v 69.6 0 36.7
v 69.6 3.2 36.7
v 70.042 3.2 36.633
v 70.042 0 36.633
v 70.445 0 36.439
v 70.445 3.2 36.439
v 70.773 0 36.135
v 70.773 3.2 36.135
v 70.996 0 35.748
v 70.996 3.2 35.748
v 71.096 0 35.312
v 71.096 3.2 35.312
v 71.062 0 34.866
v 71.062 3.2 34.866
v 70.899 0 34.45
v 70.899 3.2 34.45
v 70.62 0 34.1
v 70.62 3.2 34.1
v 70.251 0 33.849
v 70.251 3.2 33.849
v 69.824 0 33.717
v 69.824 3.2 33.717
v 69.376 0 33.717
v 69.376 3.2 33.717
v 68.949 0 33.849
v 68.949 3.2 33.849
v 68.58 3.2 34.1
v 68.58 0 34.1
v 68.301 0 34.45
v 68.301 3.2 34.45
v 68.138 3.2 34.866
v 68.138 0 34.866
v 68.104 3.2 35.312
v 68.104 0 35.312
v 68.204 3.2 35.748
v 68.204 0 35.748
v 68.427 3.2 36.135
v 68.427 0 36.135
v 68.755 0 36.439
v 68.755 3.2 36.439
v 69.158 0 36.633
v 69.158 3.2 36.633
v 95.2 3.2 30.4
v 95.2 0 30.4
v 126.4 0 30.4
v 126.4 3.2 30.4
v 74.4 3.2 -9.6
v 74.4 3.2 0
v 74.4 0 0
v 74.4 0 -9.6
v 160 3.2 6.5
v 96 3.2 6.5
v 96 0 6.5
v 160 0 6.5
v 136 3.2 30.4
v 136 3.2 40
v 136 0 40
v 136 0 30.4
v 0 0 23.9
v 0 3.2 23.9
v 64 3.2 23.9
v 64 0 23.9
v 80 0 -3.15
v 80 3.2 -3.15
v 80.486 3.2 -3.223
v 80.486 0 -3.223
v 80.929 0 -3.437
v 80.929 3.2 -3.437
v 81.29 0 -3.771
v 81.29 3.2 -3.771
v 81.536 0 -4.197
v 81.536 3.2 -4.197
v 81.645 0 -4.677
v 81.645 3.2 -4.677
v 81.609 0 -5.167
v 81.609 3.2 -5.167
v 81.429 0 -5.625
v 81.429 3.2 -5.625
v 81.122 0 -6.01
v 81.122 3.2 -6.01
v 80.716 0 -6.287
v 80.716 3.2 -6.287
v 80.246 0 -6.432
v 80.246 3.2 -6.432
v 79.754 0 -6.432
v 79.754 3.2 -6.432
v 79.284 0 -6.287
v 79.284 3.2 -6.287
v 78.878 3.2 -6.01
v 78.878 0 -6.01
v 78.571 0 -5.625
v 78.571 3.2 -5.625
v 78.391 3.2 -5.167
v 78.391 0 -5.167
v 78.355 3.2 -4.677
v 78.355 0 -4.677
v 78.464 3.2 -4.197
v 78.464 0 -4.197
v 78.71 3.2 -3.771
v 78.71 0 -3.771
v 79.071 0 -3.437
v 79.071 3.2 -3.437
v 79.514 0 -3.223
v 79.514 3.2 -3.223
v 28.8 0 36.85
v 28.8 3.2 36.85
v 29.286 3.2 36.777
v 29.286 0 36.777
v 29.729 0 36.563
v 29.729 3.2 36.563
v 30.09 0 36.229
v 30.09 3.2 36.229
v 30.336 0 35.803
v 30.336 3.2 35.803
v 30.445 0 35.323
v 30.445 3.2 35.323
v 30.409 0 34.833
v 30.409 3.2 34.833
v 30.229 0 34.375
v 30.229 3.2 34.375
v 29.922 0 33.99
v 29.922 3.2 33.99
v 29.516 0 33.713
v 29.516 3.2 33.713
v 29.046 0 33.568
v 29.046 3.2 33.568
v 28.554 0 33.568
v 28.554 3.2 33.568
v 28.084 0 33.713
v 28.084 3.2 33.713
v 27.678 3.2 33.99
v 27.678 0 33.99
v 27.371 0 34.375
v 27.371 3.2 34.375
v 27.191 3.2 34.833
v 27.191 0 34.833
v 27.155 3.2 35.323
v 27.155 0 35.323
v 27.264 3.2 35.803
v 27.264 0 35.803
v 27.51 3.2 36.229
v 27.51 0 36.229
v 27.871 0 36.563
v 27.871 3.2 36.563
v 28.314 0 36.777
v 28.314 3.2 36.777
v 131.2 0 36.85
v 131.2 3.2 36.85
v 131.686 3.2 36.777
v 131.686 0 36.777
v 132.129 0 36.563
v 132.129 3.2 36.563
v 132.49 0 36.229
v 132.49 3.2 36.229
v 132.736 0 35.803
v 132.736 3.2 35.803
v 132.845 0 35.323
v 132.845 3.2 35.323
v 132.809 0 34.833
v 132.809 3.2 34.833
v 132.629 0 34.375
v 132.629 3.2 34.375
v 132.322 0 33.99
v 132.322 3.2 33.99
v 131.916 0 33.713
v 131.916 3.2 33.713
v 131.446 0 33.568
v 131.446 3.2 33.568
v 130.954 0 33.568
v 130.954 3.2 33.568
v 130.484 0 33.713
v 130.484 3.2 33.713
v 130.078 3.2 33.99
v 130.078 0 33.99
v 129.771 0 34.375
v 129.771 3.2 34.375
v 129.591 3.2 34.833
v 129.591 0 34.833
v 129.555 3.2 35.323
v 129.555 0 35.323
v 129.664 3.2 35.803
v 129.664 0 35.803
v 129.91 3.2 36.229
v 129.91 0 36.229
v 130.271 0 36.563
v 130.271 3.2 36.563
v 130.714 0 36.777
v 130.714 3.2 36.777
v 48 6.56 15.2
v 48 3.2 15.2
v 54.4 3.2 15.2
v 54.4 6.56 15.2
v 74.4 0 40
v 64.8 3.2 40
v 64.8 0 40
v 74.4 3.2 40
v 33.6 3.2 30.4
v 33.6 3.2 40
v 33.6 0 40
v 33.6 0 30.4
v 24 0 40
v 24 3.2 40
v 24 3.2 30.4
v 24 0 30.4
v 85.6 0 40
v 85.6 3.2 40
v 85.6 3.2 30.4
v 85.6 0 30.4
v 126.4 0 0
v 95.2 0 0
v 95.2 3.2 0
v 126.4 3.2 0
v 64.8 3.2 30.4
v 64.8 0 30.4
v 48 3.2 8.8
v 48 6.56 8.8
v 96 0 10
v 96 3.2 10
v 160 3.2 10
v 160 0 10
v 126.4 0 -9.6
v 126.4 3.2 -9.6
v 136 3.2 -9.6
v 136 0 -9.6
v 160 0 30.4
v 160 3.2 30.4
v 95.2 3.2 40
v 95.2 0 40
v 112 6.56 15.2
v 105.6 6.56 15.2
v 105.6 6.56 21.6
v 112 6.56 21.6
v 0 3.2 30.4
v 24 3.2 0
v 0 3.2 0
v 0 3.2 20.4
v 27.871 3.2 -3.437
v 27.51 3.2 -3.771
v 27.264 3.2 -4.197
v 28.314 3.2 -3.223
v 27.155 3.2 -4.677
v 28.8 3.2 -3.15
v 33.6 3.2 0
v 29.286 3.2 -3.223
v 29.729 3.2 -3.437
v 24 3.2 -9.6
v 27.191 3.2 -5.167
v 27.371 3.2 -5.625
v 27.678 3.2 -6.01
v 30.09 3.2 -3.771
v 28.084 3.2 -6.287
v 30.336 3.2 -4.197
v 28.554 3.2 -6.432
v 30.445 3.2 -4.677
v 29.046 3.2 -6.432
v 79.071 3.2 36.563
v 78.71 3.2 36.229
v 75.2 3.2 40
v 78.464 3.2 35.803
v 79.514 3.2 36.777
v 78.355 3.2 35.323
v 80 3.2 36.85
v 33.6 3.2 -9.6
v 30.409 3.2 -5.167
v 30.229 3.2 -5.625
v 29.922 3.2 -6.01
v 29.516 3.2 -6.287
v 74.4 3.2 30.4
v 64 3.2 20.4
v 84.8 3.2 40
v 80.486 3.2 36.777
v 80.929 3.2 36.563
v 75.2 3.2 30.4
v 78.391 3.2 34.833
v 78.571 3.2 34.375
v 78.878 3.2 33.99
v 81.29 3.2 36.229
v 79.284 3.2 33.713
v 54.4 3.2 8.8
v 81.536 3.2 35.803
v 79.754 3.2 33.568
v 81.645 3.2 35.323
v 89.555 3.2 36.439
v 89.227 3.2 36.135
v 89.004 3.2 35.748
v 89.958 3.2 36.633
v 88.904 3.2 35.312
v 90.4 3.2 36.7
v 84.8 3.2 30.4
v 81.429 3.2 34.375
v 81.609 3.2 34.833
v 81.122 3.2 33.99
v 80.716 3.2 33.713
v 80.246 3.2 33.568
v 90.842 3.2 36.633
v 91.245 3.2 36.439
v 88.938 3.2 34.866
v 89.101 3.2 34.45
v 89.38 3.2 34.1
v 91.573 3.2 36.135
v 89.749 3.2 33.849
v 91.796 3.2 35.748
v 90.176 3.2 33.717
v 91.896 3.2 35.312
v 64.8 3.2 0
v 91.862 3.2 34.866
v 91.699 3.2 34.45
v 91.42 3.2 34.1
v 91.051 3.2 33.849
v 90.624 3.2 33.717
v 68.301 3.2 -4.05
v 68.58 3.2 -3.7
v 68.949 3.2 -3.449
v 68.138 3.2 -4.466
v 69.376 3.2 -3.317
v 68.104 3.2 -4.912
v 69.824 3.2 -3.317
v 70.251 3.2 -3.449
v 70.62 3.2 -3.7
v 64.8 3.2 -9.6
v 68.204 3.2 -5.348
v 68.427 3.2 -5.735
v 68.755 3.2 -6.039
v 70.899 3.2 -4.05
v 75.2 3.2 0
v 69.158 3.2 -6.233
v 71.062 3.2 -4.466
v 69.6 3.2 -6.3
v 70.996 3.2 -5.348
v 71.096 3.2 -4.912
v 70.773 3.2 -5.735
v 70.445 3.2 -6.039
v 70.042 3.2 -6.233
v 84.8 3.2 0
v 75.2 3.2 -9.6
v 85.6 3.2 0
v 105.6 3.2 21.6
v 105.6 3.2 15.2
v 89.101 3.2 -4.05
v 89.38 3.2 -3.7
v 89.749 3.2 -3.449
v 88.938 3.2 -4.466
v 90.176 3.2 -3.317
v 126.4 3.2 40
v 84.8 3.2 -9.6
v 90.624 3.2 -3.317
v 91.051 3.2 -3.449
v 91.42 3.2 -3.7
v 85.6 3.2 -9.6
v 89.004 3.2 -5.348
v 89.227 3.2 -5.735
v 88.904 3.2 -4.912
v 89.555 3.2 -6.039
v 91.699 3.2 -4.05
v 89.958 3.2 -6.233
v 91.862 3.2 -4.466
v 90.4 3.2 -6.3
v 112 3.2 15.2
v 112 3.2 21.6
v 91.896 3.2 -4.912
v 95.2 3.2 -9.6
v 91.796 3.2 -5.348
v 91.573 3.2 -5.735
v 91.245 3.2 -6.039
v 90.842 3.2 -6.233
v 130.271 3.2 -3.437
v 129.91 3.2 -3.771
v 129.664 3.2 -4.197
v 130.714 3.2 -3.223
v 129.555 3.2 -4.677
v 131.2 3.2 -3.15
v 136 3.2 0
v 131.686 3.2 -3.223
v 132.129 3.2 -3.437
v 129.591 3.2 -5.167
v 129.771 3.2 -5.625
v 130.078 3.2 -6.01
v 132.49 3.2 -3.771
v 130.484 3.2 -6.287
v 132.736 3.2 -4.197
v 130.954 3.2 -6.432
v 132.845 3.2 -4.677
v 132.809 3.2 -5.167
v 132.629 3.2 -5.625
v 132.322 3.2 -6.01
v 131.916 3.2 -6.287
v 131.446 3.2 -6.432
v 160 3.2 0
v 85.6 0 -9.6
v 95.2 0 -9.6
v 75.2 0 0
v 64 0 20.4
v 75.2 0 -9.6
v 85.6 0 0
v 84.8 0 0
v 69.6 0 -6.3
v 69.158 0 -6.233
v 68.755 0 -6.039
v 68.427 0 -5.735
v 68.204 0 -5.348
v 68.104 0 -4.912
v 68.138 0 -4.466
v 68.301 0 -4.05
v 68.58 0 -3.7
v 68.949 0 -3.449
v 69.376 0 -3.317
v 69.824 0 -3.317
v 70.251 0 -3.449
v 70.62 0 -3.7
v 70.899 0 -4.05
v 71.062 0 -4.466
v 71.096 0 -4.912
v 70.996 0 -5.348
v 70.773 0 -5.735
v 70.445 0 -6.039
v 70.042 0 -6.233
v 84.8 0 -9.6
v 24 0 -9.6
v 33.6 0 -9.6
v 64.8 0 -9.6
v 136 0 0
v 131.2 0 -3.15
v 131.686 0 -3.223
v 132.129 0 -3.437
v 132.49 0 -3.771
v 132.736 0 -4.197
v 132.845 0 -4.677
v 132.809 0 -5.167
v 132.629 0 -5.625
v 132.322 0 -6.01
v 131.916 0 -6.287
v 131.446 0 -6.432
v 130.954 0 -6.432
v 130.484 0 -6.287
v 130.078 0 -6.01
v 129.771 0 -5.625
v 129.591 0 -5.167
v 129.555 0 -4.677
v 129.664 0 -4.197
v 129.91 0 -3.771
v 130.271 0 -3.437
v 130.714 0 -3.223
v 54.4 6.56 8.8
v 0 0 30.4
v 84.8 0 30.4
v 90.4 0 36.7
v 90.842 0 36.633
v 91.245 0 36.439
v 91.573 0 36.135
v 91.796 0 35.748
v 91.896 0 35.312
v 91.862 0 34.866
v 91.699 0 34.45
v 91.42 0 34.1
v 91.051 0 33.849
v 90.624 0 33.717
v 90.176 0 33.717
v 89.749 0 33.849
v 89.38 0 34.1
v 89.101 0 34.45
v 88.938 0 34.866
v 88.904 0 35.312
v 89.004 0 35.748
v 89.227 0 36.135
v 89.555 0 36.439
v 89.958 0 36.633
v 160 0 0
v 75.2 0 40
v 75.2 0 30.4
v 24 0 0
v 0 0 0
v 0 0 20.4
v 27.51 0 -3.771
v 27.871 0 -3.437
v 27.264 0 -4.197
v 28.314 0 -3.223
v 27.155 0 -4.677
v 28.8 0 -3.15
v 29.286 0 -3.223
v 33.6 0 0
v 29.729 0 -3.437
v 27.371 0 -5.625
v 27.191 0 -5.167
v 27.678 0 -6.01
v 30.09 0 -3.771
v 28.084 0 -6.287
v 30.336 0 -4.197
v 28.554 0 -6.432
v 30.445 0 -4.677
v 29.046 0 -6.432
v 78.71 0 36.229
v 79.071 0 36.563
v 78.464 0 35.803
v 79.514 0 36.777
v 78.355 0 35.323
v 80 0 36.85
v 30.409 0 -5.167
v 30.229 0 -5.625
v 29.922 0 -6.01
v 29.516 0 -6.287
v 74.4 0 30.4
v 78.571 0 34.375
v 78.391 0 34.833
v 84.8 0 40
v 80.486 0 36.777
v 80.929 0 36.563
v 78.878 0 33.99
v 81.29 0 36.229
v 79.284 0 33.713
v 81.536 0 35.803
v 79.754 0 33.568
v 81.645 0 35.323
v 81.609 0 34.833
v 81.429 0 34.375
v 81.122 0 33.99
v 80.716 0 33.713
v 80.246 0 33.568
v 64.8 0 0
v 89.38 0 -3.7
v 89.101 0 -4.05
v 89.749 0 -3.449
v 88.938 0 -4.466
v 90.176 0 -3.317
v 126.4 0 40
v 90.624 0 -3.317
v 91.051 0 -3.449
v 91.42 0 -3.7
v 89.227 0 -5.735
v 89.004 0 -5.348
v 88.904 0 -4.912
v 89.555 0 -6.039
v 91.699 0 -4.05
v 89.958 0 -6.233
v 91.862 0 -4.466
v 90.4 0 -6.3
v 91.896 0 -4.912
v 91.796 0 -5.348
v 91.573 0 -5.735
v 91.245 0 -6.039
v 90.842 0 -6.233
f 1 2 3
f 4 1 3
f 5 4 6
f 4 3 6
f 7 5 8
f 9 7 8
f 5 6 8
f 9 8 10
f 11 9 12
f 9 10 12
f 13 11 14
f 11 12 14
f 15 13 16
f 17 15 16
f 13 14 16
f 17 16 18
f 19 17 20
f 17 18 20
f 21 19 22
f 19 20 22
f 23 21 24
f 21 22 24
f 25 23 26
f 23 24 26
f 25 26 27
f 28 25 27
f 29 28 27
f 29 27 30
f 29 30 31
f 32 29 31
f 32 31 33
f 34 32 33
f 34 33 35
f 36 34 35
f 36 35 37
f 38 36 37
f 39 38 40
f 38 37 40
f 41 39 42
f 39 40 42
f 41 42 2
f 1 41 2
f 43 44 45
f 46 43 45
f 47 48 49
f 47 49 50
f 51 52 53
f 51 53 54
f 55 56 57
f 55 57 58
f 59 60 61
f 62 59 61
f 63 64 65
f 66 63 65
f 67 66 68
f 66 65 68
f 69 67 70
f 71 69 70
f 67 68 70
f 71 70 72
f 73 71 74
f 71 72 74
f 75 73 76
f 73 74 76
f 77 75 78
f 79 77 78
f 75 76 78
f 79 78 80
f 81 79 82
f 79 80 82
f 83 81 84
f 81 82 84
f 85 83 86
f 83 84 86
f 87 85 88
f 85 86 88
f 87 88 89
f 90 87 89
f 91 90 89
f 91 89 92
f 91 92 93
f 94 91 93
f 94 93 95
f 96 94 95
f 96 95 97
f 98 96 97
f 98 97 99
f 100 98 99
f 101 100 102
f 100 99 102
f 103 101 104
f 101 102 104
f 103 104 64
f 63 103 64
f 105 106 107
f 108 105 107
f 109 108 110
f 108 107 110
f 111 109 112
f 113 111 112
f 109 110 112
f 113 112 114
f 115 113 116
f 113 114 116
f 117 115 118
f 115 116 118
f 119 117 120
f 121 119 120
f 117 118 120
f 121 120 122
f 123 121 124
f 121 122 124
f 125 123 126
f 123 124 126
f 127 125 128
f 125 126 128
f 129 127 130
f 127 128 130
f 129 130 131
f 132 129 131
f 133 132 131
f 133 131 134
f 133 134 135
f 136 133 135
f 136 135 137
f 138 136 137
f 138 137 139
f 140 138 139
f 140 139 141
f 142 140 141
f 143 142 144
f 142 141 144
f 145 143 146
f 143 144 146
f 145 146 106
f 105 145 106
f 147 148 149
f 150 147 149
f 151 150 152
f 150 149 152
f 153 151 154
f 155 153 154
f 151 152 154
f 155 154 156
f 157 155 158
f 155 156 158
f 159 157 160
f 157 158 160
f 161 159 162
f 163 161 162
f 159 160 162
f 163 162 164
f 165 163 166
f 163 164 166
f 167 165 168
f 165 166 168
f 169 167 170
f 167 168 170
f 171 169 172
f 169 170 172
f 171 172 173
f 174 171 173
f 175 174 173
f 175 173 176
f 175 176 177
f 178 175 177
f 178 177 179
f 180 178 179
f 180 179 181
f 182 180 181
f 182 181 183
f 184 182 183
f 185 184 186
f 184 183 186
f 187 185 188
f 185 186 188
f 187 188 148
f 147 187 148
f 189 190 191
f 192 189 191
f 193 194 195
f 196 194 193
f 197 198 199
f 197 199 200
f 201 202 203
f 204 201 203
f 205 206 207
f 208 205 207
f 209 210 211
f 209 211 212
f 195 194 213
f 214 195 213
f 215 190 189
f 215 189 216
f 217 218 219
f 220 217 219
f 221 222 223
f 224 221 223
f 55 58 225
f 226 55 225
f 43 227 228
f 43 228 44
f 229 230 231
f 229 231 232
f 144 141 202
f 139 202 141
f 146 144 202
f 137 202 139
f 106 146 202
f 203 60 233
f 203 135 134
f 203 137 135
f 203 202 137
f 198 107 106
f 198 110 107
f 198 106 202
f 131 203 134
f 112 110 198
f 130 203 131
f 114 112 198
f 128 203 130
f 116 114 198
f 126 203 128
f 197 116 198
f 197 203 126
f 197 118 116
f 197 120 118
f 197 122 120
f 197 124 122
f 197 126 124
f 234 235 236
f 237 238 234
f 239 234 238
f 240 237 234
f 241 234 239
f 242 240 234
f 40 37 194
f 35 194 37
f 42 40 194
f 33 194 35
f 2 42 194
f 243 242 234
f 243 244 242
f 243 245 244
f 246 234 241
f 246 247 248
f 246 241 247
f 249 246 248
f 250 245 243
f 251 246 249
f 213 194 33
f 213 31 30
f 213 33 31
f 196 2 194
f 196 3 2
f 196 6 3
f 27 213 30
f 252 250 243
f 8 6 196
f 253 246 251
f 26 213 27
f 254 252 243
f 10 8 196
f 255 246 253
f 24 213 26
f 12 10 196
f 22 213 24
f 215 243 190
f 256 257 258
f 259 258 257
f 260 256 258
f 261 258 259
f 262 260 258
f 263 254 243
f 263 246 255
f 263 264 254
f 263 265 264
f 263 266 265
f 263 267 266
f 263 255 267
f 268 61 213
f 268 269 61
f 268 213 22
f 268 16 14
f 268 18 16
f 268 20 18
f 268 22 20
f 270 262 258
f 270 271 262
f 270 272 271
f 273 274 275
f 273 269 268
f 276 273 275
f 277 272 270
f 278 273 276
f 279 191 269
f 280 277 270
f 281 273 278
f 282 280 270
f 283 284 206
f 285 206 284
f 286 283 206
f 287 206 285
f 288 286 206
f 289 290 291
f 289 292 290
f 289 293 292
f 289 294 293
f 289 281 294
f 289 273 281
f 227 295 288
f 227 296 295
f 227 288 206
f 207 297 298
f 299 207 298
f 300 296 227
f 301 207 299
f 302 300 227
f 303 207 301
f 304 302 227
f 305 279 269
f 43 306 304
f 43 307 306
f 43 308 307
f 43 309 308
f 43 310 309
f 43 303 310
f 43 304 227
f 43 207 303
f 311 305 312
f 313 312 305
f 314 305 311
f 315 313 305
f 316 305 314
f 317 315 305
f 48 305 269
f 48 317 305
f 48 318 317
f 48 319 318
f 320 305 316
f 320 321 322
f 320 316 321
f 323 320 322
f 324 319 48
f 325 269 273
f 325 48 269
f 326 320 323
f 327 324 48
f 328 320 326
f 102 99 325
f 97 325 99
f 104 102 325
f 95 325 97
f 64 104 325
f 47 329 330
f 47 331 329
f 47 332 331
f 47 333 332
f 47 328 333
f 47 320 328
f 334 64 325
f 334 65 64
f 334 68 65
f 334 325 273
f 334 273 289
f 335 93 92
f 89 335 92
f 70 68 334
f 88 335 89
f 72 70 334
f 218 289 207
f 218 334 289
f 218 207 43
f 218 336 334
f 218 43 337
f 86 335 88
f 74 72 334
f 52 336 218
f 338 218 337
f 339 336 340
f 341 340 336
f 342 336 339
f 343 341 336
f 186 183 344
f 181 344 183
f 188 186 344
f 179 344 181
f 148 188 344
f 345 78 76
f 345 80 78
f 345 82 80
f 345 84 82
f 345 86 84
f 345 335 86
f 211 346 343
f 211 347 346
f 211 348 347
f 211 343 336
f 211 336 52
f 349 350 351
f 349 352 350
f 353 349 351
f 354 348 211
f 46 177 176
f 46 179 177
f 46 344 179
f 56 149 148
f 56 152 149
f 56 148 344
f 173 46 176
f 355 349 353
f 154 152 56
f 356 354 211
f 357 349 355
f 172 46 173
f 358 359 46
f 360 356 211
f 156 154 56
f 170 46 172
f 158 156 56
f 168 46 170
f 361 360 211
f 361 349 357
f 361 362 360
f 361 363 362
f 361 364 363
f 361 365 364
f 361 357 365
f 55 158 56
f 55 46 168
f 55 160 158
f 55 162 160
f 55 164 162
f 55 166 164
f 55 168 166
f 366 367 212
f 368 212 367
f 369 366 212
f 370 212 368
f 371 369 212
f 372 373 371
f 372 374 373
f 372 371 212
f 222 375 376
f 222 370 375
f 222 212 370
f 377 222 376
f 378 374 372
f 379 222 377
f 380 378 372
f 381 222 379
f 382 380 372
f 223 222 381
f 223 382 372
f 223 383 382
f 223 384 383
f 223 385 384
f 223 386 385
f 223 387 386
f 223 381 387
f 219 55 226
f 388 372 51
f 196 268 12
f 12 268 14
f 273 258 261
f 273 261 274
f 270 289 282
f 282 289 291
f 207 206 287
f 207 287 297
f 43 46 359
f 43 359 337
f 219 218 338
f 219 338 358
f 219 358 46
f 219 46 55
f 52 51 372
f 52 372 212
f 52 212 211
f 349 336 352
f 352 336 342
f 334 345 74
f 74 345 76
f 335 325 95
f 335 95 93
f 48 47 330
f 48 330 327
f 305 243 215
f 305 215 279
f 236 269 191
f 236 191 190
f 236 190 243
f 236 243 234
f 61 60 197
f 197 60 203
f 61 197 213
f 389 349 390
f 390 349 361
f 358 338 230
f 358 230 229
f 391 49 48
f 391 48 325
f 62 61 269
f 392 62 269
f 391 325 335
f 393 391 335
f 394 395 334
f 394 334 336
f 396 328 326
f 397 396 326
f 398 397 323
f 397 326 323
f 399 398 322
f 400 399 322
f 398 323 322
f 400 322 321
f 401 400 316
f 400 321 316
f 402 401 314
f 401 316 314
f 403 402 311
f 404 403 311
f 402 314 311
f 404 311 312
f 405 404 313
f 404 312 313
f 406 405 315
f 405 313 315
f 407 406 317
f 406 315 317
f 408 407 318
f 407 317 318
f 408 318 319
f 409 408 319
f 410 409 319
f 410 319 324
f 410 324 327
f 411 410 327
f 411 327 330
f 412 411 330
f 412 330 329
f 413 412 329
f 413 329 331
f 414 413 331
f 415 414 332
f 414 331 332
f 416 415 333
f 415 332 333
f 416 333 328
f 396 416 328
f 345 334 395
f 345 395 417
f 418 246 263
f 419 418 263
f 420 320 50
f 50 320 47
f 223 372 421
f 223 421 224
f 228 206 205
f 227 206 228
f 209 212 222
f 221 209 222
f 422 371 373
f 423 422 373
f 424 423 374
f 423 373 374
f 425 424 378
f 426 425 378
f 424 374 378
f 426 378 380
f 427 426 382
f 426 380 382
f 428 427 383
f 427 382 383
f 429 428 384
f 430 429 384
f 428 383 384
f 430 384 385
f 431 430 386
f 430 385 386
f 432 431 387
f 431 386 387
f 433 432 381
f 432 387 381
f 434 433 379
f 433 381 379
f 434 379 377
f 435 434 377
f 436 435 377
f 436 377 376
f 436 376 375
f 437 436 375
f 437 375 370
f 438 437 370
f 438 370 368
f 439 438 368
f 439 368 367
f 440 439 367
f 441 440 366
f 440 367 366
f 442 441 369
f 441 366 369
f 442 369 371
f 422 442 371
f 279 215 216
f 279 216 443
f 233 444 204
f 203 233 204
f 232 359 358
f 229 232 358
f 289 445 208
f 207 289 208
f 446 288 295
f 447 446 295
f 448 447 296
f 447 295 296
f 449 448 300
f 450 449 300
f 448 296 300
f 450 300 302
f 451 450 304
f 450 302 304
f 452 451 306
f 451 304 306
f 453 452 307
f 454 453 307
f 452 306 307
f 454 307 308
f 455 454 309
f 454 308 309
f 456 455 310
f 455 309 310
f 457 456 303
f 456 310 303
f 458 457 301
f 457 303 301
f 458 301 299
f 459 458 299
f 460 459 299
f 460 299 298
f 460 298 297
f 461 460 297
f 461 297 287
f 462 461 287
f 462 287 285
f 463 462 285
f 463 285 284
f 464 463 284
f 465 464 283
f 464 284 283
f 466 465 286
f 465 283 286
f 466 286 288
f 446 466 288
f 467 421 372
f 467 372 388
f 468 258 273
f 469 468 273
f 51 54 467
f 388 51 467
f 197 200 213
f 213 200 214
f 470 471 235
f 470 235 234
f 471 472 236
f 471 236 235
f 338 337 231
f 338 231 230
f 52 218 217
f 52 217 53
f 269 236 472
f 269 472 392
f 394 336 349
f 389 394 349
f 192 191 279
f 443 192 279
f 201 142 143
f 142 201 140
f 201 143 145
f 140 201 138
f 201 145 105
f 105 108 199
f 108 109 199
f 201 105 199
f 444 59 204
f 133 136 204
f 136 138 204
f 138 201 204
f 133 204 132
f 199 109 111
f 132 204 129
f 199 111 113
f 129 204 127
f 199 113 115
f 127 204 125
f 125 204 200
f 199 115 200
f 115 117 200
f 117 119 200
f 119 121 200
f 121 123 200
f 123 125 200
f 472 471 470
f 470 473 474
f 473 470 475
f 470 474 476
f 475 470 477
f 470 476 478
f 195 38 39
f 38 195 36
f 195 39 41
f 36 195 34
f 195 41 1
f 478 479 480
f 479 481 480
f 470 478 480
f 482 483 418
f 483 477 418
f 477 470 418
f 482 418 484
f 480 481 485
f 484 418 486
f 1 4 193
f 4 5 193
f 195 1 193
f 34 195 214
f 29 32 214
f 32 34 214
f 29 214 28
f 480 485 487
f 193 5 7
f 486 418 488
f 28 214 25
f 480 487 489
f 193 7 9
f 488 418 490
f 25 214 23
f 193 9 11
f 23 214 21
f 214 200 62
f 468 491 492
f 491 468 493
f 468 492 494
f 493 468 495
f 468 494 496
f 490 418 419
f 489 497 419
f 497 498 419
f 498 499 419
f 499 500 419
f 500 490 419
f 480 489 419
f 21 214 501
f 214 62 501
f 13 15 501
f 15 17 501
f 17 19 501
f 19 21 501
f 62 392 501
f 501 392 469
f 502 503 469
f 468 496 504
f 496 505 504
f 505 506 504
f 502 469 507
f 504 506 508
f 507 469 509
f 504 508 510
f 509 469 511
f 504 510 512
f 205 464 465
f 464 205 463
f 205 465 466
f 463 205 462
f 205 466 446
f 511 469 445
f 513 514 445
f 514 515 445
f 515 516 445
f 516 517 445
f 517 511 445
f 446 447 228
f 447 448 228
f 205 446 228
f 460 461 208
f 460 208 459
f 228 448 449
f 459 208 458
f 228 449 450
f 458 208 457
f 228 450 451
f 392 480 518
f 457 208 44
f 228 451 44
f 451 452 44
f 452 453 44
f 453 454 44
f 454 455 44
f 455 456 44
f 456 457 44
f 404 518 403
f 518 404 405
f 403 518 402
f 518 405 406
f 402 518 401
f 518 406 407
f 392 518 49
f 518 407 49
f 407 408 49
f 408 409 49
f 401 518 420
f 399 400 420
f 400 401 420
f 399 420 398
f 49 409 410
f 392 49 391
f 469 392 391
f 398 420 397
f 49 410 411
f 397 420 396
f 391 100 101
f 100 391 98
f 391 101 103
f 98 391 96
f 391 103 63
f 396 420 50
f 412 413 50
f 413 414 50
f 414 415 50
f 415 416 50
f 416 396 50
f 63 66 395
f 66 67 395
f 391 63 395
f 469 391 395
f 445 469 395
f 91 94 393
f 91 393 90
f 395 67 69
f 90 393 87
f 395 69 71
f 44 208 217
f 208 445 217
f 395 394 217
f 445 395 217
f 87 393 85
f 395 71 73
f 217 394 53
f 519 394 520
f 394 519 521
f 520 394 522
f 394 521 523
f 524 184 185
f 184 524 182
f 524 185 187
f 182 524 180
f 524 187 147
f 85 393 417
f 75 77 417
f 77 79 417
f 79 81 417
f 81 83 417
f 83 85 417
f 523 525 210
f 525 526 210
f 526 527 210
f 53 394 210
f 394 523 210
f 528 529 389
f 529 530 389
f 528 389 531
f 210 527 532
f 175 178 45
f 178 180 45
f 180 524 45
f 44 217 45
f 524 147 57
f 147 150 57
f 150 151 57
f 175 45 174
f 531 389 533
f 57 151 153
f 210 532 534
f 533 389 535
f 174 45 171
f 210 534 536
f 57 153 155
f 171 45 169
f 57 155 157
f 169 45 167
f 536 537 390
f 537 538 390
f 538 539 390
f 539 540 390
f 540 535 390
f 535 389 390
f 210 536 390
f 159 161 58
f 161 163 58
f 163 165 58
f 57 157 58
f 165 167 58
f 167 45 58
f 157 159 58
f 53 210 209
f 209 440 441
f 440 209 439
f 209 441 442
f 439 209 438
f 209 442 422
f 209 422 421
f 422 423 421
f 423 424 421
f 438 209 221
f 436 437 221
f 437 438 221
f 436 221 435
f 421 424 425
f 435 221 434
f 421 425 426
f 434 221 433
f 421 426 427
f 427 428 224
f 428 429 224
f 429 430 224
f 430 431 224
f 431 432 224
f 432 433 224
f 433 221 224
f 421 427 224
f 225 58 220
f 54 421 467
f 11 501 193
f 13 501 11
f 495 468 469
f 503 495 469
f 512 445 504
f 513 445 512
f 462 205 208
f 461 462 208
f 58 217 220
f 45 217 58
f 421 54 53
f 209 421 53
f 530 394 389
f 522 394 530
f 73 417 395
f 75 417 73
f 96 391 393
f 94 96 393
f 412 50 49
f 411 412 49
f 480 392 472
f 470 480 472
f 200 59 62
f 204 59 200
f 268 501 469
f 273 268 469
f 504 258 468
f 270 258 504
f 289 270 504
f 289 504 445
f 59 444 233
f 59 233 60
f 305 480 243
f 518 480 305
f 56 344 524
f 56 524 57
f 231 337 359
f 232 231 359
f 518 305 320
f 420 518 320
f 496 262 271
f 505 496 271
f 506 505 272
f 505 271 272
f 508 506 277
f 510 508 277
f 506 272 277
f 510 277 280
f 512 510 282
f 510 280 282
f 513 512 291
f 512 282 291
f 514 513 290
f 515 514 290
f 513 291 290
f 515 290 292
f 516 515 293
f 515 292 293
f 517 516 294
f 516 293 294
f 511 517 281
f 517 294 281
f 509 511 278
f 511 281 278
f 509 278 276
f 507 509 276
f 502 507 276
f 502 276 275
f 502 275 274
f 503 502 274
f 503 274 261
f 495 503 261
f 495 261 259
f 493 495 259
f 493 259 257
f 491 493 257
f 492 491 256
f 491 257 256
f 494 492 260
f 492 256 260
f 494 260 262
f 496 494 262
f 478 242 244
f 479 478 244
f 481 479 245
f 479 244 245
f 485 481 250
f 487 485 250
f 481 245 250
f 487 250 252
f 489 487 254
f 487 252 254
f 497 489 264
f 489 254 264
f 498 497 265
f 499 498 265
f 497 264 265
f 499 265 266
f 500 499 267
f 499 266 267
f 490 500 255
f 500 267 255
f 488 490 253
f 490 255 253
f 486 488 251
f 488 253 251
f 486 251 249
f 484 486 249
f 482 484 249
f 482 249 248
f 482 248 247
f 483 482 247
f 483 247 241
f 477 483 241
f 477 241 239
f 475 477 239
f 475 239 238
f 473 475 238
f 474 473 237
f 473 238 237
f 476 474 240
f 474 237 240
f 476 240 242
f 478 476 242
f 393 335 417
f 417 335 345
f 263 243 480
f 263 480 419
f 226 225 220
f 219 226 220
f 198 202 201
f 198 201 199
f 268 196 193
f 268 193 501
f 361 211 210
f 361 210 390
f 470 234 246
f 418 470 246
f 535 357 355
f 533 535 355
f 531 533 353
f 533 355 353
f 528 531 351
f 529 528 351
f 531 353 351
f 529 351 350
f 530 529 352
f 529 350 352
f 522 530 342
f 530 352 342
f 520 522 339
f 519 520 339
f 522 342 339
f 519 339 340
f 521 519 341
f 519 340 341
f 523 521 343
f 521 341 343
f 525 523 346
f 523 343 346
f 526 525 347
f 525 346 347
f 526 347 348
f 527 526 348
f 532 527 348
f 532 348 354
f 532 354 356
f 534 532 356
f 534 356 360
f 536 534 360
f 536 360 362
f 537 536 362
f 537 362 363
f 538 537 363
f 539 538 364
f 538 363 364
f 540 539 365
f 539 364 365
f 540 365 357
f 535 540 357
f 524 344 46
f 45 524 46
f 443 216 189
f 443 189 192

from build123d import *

# Parameters (mm, degrees)
SKETCH1_W           = 160
SKETCH1_H           = 30.4
BOSS_EXTRUDE1_DEPTH = 3.2
SKETCH2_W           = 9.6
SKETCH2_H           = 9.6
SKETCH2_R           = 1.65
BOSS_EXTRUDE2_DEPTH = 3.2
SKETCH3_W           = 64
SKETCH3_H           = 3.5
CUT_EXTRUDE1_DEPTH  = 165.955266663
SKETCH4_W           = 9.6
SKETCH4_H           = 9.6
SKETCH4_R           = 1.5
BOSS_EXTRUDE3_DEPTH = 3.2
SKETCH5_W           = 6.4
SKETCH5_H           = 6.4
BOSS_EXTRUDE4_DEPTH = 3.36


with BuildPart() as part:
    # Sketch1 → Boss-Extrude1 (new body)
    with BuildSketch(Plane(origin=(0, 0, 0), x_dir=(1, 0, 0), z_dir=(0, 1, 0))):
        with Locations((80, -15.2)):
            Rectangle(SKETCH1_W, SKETCH1_H)
    extrude(amount=BOSS_EXTRUDE1_DEPTH)

    # Sketch2 → Boss-Extrude2 (add)
    # profile 1 of 6: a face of its own
    with BuildSketch(Plane(origin=(0, 3.2, 0), x_dir=(1, 0, 0), z_dir=(0, 1, 0))):
        with Locations((28.8, -35.2)):
            Rectangle(SKETCH2_W, SKETCH2_H)
        with Locations(Location((28.8, -35.2, 0), (0, 0, 270))):
            Circle(SKETCH2_R, mode=Mode.SUBTRACT)
    # profile 2 of 6: a face of its own
    with BuildSketch(Plane(origin=(0, 3.2, 0), x_dir=(1, 0, 0), z_dir=(0, 1, 0))):
        with Locations((80, -35.2)):
            Rectangle(SKETCH2_W, SKETCH2_H)
        with Locations(Location((80, -35.2, 0), (0, 0, 270))):
            Circle(SKETCH2_R, mode=Mode.SUBTRACT)
    # profile 3 of 6: a face of its own
    with BuildSketch(Plane(origin=(0, 3.2, 0), x_dir=(1, 0, 0), z_dir=(0, 1, 0))):
        with Locations((131.2, -35.2)):
            Rectangle(SKETCH2_W, SKETCH2_H)
        with Locations(Location((131.2, -35.2, 0), (0, 0, 270))):
            Circle(SKETCH2_R, mode=Mode.SUBTRACT)
    # profile 4 of 6: a face of its own
    with BuildSketch(Plane(origin=(0, 3.2, 0), x_dir=(1, 0, 0), z_dir=(0, 1, 0))):
        with Locations((80, 4.8)):
            Rectangle(SKETCH2_W, SKETCH2_H)
        with Locations(Location((80, 4.8, 0), (0, 0, 270))):
            Circle(SKETCH2_R, mode=Mode.SUBTRACT)
    # profile 5 of 6: a face of its own
    with BuildSketch(Plane(origin=(0, 3.2, 0), x_dir=(1, 0, 0), z_dir=(0, 1, 0))):
        with Locations((131.2, 4.8)):
            Rectangle(SKETCH2_W, SKETCH2_H)
        with Locations(Location((131.2, 4.8, 0), (0, 0, 270))):
            Circle(SKETCH2_R, mode=Mode.SUBTRACT)
    # profile 6 of 6: a face of its own
    with BuildSketch(Plane(origin=(0, 3.2, 0), x_dir=(1, 0, 0), z_dir=(0, 1, 0))):
        with Locations((28.8, 4.8)):
            Rectangle(SKETCH2_W, SKETCH2_H)
        with Locations(Location((28.8, 4.8, 0), (0, 0, 270))):
            Circle(SKETCH2_R, mode=Mode.SUBTRACT)
    extrude(amount=-BOSS_EXTRUDE2_DEPTH)

    # Sketch3 → Cut-Extrude1 (cut, through all)
    with BuildSketch(Plane(origin=(0, 3.2, 0), x_dir=(1, 0, 0), z_dir=(0, 1, 0))):
        with Locations((32, -22.15)):
            Rectangle(SKETCH3_W, SKETCH3_H)
        with Locations((128, -8.25)):
            Rectangle(SKETCH3_W, SKETCH3_H)
    extrude(amount=-CUT_EXTRUDE1_DEPTH, mode=Mode.SUBTRACT)

    # Sketch4 → Boss-Extrude3 (add)
    # profile 1 of 4: a face of its own
    with BuildSketch(Plane(origin=(0, 3.2, 0), x_dir=(1, 0, 0), z_dir=(0, 1, 0))):
        with Locations((69.6, -35.2)):
            Rectangle(SKETCH4_W, SKETCH4_H)
        with Locations(Location((69.6, -35.2, 0), (0, 0, 270))):
            Circle(SKETCH4_R, mode=Mode.SUBTRACT)
    # profile 2 of 4: a face of its own
    with BuildSketch(Plane(origin=(0, 3.2, 0), x_dir=(1, 0, 0), z_dir=(0, 1, 0))):
        with Locations((90.4, -35.2)):
            Rectangle(SKETCH4_W, SKETCH4_H)
        with Locations(Location((90.4, -35.2, 0), (0, 0, 270))):
            Circle(SKETCH4_R, mode=Mode.SUBTRACT)
    # profile 3 of 4: a face of its own
    with BuildSketch(Plane(origin=(0, 3.2, 0), x_dir=(1, 0, 0), z_dir=(0, 1, 0))):
        with Locations((90.4, 4.8)):
            Rectangle(SKETCH4_W, SKETCH4_H)
        with Locations(Location((90.4, 4.8, 0), (0, 0, 90))):
            Circle(SKETCH4_R, mode=Mode.SUBTRACT)
    # profile 4 of 4: a face of its own
    with BuildSketch(Plane(origin=(0, 3.2, 0), x_dir=(1, 0, 0), z_dir=(0, 1, 0))):
        with Locations((69.6, 4.8)):
            Rectangle(SKETCH4_W, SKETCH4_H)
        with Locations(Location((69.6, 4.8, 0), (0, 0, 90))):
            Circle(SKETCH4_R, mode=Mode.SUBTRACT)
    extrude(amount=-BOSS_EXTRUDE3_DEPTH)

    # Sketch5 → Boss-Extrude4 (add)
    with BuildSketch(Plane(origin=(0, 3.2, 0), x_dir=(1, 0, 0), z_dir=(0, 1, 0))):
        with Locations((51.2, -12)):
            Rectangle(SKETCH5_W, SKETCH5_H)
        with Locations((108.8, -18.4)):
            Rectangle(SKETCH5_W, SKETCH5_H)
    extrude(amount=BOSS_EXTRUDE4_DEPTH)


solid = part.part
